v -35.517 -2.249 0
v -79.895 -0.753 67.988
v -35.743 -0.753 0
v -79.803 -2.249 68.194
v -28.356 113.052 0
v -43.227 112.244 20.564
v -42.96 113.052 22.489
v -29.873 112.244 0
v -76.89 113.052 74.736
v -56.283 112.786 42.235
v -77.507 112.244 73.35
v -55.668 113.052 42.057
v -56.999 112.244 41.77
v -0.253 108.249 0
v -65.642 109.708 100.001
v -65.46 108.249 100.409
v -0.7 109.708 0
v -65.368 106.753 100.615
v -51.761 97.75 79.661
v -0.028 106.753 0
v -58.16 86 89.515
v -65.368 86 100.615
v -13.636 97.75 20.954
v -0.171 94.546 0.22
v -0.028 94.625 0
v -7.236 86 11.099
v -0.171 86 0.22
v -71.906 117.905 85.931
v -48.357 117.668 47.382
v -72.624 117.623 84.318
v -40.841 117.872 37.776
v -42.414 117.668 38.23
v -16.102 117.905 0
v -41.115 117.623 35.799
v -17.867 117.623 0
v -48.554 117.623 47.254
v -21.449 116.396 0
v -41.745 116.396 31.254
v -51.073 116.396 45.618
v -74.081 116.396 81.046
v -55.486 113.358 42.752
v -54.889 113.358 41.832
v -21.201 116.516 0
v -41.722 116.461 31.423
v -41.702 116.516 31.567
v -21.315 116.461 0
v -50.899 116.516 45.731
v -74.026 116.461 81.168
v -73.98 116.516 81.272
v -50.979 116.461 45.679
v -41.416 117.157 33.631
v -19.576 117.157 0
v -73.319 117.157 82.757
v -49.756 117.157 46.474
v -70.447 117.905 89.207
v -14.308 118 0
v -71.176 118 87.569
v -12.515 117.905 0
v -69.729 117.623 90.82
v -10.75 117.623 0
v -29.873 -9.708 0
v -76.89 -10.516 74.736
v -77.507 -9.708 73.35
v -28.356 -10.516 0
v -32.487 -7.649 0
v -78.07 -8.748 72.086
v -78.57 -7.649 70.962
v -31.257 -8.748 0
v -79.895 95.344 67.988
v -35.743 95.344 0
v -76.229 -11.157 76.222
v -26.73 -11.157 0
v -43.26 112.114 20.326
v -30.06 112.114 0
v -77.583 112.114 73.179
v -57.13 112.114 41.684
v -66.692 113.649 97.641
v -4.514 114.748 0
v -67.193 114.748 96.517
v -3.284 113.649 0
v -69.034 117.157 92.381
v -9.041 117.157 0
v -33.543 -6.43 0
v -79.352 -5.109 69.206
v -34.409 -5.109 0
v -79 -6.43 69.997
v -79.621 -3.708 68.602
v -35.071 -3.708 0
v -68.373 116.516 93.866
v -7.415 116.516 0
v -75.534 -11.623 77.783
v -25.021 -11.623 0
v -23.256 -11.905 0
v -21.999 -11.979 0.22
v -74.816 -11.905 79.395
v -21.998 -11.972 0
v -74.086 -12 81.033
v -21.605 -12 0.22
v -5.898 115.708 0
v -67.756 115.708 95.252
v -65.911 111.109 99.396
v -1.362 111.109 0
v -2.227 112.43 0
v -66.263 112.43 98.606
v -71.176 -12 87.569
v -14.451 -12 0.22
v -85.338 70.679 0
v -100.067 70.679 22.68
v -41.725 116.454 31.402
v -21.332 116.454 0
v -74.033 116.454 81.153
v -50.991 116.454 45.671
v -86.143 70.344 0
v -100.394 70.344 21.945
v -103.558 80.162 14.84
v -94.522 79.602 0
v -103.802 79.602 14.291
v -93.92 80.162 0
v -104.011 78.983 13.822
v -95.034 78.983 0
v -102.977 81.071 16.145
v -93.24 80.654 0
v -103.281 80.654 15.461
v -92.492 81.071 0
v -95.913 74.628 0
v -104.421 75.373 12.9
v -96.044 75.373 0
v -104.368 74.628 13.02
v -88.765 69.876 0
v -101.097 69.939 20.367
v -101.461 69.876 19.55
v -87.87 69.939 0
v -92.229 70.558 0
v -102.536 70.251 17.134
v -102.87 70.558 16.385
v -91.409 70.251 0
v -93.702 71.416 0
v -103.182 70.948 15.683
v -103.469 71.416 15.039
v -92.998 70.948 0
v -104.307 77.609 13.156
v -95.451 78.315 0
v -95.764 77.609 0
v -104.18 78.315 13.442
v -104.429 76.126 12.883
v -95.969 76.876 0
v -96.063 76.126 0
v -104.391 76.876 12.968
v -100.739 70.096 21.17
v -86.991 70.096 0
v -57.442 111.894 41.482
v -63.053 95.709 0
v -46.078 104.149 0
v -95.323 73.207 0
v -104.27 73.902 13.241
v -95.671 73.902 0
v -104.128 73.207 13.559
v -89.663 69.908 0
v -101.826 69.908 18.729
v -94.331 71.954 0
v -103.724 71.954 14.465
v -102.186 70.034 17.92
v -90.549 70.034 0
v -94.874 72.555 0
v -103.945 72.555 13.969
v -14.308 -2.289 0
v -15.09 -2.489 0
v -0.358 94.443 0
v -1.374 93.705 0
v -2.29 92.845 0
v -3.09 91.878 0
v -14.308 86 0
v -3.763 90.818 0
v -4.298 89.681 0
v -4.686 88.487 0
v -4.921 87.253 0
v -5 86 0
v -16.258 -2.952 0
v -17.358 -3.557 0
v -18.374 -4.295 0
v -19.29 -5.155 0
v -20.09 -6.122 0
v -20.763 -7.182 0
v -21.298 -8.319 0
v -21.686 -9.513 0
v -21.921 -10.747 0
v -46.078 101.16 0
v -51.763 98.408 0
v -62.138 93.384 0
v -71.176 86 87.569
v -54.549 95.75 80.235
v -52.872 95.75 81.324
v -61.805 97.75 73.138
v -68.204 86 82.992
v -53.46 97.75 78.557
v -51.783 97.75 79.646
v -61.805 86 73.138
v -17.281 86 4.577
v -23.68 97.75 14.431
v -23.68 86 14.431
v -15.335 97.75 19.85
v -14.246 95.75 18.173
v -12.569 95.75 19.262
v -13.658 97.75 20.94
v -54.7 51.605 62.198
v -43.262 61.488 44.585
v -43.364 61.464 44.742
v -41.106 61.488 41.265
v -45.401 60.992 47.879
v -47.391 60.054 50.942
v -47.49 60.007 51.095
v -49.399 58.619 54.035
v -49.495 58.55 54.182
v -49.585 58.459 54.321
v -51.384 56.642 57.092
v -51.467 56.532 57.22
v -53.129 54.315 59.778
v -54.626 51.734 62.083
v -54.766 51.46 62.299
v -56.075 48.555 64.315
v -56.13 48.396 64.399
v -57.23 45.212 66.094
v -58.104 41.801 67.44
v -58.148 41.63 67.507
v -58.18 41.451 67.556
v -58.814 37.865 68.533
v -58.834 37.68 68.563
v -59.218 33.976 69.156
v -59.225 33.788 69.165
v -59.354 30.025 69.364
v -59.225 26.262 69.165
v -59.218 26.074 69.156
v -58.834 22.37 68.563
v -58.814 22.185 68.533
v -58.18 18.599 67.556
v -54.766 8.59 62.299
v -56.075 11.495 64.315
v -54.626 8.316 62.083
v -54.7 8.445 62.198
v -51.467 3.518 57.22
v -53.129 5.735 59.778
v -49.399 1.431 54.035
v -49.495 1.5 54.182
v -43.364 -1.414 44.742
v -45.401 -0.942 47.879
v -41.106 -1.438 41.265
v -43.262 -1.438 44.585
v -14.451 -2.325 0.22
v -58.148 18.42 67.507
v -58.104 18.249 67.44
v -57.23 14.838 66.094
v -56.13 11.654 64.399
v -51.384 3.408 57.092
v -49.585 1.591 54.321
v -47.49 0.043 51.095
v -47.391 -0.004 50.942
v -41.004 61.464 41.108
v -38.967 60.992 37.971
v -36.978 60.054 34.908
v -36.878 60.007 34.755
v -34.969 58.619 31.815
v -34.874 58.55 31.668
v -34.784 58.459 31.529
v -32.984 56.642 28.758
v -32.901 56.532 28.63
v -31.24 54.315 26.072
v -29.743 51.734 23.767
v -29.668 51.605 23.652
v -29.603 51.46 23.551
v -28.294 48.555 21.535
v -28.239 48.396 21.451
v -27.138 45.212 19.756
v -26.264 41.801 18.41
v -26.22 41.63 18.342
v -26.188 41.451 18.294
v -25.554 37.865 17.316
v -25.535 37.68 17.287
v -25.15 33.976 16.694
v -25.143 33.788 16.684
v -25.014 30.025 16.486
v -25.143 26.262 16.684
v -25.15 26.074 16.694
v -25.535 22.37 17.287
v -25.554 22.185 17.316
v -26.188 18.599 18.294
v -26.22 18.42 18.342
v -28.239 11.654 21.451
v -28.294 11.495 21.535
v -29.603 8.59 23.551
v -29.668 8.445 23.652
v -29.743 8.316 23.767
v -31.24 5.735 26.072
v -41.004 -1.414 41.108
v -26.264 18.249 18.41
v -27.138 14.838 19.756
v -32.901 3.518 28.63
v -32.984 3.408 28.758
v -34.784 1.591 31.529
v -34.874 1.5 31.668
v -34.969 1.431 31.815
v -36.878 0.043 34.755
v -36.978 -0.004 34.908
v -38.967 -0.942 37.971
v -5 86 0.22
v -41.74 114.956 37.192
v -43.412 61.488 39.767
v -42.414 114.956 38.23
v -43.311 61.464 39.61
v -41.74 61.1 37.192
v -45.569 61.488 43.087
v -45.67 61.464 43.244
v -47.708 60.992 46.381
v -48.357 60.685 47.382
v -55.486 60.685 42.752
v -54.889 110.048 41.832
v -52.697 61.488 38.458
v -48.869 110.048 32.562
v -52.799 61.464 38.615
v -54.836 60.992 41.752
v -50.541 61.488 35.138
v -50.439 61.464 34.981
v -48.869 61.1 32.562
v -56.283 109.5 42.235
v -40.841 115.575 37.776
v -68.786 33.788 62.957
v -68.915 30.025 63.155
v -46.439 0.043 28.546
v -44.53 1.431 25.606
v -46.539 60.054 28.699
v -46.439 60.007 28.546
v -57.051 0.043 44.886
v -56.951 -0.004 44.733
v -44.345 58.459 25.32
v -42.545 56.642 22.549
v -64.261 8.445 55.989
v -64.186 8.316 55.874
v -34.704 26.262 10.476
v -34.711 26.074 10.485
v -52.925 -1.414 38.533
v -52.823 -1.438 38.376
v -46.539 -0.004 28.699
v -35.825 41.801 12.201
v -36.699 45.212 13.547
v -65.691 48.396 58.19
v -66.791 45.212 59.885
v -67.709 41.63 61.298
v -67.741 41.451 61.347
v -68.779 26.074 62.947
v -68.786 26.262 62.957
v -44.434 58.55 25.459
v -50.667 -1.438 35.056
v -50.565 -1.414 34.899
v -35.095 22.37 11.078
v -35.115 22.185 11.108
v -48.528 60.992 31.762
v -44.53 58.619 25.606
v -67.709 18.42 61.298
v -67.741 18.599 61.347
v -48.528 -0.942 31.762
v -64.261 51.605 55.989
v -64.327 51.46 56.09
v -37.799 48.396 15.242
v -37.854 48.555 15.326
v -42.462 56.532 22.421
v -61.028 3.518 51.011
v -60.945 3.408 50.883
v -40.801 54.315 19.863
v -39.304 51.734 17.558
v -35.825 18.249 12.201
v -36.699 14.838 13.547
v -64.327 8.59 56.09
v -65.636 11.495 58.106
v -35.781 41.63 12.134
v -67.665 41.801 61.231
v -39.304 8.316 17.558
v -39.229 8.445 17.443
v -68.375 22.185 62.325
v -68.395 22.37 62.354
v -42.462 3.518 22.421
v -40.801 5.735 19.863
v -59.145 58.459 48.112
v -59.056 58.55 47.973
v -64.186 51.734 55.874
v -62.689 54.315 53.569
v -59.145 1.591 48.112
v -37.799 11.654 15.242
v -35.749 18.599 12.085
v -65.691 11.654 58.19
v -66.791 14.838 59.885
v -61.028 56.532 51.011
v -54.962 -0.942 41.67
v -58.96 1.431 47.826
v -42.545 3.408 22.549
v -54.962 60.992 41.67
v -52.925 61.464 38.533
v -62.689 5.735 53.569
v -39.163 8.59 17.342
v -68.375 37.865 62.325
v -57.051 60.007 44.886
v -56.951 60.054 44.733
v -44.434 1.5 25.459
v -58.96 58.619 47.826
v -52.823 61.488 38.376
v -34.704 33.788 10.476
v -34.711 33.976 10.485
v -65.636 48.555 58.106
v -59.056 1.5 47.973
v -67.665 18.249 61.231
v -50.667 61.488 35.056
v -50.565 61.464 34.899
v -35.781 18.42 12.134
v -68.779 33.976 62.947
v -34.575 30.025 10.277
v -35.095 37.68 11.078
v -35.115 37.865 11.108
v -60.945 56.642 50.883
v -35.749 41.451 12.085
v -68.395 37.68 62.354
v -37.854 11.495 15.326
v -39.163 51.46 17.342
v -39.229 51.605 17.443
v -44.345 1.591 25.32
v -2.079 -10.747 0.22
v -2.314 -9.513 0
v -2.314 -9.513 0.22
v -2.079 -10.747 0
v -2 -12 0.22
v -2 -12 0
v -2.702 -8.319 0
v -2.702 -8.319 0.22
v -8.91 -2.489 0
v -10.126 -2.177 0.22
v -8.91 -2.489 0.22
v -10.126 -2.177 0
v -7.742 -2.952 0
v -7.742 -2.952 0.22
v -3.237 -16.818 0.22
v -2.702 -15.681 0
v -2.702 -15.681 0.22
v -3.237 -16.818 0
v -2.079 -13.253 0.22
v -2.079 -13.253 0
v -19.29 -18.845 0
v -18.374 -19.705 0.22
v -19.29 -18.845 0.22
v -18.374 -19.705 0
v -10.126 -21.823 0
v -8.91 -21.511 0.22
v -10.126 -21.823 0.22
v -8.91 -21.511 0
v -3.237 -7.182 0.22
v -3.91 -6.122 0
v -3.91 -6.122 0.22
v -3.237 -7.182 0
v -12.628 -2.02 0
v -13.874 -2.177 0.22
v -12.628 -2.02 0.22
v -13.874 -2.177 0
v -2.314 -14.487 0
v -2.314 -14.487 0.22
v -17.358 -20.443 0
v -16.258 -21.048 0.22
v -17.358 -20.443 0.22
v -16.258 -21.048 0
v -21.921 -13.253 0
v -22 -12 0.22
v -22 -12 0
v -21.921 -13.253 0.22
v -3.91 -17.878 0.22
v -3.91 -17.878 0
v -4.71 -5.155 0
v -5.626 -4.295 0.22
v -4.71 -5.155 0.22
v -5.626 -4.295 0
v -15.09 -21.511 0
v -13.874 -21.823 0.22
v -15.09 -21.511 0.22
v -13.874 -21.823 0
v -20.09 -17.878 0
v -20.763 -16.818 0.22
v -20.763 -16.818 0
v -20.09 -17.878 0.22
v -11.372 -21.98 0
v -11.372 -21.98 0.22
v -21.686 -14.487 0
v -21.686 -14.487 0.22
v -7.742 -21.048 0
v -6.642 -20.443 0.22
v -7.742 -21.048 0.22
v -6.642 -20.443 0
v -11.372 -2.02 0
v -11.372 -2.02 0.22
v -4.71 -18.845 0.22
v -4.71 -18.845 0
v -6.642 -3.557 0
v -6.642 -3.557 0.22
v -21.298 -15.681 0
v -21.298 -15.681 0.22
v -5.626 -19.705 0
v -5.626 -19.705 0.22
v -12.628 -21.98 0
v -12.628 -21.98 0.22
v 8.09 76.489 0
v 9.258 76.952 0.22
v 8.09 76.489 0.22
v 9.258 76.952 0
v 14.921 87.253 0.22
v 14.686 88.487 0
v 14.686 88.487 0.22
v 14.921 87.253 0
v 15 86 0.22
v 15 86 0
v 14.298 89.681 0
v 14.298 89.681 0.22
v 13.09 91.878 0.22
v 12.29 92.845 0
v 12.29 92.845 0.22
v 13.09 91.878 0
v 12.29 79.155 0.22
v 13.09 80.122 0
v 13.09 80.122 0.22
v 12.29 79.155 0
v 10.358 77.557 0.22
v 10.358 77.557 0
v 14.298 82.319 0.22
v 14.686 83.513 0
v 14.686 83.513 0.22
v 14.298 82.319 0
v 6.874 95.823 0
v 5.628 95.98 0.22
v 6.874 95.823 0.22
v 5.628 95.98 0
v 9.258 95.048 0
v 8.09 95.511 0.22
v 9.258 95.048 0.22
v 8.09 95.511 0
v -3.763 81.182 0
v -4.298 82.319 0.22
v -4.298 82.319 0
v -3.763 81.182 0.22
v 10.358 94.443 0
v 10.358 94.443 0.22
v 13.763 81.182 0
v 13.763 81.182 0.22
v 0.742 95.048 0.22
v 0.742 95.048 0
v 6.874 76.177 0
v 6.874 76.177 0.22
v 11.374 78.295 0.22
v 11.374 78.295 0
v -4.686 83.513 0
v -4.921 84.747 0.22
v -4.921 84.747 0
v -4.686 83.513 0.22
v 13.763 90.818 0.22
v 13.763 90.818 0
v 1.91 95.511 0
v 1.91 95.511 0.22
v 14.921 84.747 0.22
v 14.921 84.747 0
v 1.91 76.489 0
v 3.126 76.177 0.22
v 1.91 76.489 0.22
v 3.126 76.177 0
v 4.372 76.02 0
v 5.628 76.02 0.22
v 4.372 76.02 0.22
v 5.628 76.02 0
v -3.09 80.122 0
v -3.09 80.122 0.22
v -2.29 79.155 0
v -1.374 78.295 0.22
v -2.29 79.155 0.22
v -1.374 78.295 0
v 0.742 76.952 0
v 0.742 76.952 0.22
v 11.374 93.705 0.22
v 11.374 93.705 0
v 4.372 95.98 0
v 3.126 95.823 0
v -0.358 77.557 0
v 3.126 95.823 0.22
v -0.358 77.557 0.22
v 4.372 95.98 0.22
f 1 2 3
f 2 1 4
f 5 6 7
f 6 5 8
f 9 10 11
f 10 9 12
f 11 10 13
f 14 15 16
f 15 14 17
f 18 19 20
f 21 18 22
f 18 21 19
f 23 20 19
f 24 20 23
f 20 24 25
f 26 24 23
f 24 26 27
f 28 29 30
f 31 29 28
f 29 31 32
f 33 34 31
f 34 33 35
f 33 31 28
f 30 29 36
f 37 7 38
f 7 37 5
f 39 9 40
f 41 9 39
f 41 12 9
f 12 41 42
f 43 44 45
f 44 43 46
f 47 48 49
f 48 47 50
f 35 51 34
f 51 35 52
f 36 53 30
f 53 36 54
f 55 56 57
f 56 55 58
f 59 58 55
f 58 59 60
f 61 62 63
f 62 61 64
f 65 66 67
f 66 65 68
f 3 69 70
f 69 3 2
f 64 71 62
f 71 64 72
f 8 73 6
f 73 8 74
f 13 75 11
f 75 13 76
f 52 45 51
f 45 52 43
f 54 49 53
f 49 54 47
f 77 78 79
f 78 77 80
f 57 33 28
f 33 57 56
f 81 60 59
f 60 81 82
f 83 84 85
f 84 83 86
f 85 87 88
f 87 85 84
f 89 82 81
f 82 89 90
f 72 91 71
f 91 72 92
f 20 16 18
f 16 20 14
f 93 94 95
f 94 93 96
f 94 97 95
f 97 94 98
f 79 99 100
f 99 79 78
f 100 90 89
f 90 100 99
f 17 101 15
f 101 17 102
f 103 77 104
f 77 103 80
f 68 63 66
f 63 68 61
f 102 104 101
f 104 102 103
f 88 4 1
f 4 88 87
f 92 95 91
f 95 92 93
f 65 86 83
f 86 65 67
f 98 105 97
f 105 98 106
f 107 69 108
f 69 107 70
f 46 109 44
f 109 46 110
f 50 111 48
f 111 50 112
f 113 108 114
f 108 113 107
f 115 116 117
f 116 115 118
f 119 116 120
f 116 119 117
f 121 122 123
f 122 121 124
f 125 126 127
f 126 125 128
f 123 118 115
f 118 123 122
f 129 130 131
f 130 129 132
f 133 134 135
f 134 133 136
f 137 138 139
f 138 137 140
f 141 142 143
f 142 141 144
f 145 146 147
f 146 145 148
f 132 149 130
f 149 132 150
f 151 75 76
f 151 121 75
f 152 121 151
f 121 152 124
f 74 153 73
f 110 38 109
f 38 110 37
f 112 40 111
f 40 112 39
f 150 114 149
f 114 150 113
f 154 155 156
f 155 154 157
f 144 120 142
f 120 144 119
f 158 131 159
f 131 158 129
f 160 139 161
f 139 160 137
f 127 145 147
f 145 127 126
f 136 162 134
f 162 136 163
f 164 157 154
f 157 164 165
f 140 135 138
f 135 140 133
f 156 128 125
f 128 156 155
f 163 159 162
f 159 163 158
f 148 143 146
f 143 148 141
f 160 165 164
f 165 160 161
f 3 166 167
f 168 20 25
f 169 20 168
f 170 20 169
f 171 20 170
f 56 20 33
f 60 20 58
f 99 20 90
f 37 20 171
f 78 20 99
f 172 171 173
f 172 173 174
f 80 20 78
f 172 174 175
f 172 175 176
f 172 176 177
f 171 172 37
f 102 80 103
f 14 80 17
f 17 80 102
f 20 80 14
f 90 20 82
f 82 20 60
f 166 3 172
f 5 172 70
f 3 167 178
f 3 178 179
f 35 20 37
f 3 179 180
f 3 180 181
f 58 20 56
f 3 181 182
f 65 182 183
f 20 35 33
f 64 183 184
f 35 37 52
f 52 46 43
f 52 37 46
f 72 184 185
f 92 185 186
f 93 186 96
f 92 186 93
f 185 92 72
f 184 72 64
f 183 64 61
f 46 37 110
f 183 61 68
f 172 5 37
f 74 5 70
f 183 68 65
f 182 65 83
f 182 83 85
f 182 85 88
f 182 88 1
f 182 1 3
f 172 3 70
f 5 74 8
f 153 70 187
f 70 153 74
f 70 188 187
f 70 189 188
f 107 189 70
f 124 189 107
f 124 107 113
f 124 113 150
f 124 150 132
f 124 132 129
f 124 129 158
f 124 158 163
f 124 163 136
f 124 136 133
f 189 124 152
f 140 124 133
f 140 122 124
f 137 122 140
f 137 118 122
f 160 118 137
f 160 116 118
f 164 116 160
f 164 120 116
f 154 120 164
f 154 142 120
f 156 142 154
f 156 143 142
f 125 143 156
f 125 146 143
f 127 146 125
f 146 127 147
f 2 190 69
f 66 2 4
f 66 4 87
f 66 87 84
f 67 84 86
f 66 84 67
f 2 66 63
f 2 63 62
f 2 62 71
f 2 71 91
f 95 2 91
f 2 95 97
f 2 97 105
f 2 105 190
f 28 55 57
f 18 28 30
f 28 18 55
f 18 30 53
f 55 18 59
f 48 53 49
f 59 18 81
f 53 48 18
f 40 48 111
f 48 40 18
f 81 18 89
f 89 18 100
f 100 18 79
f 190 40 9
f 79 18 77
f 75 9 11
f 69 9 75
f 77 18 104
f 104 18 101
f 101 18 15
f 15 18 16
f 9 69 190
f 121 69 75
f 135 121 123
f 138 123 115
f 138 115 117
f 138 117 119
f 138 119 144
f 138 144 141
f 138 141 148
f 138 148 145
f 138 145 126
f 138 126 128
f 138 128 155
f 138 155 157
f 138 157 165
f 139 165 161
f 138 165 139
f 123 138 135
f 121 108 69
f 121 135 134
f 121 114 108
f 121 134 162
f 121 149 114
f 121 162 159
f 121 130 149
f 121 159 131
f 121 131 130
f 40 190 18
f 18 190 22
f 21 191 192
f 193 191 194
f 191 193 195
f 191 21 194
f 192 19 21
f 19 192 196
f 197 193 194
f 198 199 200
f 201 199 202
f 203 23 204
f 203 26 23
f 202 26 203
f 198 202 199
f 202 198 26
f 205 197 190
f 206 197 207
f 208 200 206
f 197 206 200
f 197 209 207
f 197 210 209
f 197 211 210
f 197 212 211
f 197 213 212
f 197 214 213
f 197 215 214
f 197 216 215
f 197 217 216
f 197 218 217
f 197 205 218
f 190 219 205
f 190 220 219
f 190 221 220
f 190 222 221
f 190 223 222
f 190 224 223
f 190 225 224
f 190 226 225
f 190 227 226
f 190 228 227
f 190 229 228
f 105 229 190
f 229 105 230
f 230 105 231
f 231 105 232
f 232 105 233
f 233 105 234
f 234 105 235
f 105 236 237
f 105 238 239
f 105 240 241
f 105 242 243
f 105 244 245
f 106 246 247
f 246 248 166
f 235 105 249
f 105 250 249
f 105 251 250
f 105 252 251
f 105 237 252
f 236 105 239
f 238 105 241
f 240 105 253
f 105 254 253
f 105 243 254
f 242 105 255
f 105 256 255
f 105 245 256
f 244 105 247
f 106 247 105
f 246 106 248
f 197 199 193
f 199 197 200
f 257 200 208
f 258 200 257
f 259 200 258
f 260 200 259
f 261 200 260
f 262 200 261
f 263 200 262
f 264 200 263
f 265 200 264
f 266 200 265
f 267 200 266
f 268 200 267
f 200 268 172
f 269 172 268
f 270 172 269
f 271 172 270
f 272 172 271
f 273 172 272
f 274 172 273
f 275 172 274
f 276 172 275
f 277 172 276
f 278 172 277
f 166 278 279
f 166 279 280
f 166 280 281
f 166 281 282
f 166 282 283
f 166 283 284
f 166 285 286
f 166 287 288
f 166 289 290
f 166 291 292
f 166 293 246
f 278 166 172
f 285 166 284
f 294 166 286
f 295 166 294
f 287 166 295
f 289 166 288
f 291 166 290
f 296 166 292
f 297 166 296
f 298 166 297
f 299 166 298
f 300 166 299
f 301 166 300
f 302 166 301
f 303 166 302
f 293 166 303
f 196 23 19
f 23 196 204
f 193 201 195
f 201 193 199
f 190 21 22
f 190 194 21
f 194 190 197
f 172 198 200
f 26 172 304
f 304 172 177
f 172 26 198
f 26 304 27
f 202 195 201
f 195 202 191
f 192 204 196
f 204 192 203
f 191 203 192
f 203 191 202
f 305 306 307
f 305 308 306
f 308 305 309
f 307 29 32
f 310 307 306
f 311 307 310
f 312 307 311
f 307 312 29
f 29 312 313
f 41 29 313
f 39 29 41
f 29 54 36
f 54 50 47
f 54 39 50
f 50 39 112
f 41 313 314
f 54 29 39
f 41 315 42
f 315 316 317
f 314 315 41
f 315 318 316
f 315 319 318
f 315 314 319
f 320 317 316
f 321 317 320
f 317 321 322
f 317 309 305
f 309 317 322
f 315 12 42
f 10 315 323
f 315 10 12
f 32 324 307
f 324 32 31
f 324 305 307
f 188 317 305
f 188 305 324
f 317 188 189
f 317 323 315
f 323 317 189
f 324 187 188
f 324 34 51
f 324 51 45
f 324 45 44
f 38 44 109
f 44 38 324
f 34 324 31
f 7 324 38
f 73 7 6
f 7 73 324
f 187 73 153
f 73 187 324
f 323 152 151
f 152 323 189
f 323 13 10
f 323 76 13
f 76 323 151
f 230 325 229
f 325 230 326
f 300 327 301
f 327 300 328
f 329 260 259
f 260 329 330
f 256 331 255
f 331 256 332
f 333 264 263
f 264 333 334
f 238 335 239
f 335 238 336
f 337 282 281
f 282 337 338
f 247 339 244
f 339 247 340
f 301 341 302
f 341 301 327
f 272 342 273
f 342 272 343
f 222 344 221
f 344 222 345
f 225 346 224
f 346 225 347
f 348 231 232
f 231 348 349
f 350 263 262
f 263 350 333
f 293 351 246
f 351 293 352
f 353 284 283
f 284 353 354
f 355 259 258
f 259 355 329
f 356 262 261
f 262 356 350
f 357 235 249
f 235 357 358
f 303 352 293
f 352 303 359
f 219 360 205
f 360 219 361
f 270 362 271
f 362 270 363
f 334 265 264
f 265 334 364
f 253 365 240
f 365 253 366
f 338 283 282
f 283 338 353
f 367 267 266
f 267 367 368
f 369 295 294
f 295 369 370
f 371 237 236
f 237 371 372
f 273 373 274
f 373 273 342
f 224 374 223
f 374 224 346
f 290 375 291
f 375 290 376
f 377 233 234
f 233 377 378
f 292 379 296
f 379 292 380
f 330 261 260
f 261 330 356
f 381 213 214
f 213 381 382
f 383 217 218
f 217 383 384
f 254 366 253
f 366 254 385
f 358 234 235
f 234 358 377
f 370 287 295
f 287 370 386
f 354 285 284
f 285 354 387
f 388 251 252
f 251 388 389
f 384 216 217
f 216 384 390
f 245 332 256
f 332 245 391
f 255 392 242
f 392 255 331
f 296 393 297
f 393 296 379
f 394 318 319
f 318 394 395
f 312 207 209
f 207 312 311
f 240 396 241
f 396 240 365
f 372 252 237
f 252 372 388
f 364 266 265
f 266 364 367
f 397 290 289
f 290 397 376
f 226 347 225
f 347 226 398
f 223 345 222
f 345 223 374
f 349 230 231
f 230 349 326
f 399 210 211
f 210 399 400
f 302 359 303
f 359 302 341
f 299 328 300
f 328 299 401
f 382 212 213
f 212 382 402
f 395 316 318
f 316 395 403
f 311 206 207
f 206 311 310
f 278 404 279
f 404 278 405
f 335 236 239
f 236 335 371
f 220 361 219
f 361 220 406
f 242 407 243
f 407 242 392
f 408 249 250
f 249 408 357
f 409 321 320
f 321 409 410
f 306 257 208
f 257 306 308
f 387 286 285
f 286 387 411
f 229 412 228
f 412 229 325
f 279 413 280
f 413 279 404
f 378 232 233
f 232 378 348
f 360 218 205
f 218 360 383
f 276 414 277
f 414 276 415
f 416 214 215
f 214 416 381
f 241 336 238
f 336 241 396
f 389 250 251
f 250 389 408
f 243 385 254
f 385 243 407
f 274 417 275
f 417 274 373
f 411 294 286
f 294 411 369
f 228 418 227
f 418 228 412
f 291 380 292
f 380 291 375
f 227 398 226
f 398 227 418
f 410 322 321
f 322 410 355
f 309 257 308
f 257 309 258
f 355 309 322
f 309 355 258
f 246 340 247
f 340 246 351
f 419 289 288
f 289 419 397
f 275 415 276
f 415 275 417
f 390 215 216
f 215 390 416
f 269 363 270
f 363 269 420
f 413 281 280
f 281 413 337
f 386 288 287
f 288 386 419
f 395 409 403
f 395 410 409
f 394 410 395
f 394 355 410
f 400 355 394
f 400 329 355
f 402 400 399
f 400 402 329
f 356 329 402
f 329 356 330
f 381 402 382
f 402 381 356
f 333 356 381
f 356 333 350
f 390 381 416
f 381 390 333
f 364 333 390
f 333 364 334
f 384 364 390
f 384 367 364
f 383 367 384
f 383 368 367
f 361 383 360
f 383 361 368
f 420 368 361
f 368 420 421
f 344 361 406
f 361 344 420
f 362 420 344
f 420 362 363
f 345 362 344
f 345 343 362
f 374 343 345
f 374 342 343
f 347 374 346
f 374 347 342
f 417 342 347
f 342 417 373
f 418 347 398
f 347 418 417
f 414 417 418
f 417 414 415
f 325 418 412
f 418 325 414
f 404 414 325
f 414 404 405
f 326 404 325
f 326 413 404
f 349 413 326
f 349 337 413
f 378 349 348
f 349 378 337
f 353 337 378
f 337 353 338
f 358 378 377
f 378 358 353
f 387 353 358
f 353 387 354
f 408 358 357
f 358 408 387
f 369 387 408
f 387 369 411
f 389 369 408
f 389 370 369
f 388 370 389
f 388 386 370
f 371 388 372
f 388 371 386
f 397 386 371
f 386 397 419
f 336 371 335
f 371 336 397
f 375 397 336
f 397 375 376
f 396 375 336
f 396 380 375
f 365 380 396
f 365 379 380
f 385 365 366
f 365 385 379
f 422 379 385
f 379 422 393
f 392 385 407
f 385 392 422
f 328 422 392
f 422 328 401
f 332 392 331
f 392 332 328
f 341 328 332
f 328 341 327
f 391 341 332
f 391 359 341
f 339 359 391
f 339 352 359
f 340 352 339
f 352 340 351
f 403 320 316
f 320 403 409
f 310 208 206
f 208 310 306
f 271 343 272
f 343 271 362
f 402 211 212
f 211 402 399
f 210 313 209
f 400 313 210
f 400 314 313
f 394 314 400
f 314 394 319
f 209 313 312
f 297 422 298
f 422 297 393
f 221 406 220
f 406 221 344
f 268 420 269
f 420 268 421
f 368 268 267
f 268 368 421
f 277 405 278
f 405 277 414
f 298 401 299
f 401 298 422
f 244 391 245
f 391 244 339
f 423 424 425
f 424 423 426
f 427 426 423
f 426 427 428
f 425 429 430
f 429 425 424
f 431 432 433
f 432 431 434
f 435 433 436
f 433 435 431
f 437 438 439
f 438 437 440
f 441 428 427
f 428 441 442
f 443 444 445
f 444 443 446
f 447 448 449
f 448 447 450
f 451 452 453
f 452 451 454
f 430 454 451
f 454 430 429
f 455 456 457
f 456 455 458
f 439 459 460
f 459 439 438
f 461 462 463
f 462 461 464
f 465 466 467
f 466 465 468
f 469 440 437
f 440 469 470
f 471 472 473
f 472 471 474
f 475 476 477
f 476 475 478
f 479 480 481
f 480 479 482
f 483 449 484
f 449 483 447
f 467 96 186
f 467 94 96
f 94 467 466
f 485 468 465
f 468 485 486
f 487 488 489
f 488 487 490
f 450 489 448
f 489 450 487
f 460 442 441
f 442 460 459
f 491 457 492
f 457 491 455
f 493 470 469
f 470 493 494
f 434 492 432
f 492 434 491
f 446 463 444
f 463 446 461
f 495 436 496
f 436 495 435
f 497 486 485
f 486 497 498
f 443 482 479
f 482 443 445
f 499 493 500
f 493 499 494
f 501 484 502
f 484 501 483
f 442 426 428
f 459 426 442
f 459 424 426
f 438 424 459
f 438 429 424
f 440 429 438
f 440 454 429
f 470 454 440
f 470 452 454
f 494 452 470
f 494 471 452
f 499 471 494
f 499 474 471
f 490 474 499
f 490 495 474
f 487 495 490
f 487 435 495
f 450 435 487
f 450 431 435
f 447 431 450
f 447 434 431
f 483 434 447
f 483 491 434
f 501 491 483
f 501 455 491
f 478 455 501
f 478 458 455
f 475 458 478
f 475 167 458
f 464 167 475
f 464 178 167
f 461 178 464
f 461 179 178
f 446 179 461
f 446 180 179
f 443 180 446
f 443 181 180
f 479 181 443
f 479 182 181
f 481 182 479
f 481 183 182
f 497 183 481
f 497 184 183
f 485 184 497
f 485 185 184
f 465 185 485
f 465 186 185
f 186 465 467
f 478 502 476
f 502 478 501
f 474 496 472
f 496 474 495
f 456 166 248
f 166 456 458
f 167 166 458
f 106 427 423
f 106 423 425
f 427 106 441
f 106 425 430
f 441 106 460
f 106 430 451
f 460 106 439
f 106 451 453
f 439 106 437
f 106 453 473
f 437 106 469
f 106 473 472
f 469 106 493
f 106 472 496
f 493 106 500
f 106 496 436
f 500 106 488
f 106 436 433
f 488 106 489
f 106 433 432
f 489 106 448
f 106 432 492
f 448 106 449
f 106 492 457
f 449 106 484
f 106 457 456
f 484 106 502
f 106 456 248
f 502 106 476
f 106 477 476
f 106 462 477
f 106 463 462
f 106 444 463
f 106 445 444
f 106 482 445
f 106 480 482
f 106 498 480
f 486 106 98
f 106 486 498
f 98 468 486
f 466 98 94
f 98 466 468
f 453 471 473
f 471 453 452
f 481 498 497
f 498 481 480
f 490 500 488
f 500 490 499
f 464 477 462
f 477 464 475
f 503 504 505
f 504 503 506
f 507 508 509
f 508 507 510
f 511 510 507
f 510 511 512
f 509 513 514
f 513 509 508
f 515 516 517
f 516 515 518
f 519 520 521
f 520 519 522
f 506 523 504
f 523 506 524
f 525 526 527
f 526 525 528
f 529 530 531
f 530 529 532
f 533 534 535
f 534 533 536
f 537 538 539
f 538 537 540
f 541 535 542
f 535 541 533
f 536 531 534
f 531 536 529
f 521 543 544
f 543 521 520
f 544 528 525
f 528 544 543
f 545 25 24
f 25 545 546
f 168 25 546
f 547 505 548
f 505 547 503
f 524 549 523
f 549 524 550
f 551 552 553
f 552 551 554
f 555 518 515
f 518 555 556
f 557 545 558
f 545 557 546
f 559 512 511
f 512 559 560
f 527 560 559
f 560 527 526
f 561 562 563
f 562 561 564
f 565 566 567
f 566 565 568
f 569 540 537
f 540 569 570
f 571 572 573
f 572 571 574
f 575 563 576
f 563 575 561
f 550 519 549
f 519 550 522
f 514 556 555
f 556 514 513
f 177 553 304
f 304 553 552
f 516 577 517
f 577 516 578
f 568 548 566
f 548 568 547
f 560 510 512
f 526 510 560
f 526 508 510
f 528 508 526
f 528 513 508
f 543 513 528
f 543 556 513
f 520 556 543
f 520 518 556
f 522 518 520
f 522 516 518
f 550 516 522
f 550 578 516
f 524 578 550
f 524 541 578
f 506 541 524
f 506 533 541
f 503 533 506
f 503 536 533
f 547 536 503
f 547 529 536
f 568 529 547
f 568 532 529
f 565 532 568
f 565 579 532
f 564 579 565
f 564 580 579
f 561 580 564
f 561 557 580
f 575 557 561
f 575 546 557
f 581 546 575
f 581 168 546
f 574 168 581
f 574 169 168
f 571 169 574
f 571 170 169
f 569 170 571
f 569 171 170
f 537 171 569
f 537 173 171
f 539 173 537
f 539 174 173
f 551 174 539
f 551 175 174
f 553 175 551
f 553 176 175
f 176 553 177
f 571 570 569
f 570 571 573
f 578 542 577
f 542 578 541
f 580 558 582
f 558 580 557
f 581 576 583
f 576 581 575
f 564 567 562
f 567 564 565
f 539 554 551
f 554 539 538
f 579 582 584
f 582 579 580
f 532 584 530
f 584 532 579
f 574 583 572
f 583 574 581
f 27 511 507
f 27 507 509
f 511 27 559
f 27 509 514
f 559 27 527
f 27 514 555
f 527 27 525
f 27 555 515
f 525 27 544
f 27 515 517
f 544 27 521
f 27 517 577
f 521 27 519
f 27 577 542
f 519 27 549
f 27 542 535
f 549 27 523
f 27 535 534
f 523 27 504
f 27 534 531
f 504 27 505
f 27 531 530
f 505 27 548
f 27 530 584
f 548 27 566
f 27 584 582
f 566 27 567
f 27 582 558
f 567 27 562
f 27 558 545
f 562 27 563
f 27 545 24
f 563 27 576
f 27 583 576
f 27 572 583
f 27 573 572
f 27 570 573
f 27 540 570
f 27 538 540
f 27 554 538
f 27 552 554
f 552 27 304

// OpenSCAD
// Stand for nexus 5 and nexus 7 2013 tablet
// Has a hole for the chrger

function what_fillet(l,w) = (norm([w,w]) - l) / (norm([1,1]) - 1);
e=0.15;

nexus_charger = false;

// nexus charger
charger_top_w = 58;
charger_top_diagonal = 80.64;
charger_top_fillet_r = what_fillet(charger_top_diagonal, charger_top_w) / 2;
charger_top_h = 2.9;
charger_sticker_h = 0;
charger_h = 12.2;
charger_bottom_w = 49.23;
charger_bottom_diagonal = 65.00;
charger_bottom_fillet_r = what_fillet(charger_bottom_diagonal, charger_bottom_w) / 2;
// round charger
rcharger_r = 60.05/2;
rcharger_h = 11.4;
charger_plug_w = 12.0 + e;
charger_plug_h = nexus_charger
  ? charger_h - charger_top_h 
  : rcharger_h - charger_top_h;
bottom_offset = (charger_top_w - charger_bottom_w) / 2;
charger_outset = 1.5;
$fn=50;

n6_lip = 2;

n5_w = 70;
n5_l = 137.5;
n5_thick = 10 + n6_lip;

n7_w = 200;
n7_l = 114;
n7_thick = 9.5;

stand_w = 120;
stand_r = 12;
stand_r_base = 7;
stand_angle = 30;
stand_side_angle = 33;
device_offset = max(n5_thick, n7_thick);

module nexus_charger() {
  hull() {
    for (x = [0,1],y = [0,1]) {
      translate([
        2*x*(bottom_offset + charger_bottom_fillet_r) + x*(charger_bottom_w-2*charger_bottom_fillet_r),
        2*y*(bottom_offset + charger_bottom_fillet_r) + y*(charger_bottom_w-2*charger_bottom_fillet_r),
        0])
      mirror([x,y,0]) {
        translate([charger_top_fillet_r, charger_top_fillet_r, charger_h - charger_top_h])
        cylinder(r=charger_top_fillet_r, h=charger_top_h);
        translate([bottom_offset + charger_bottom_fillet_r, bottom_offset + charger_bottom_fillet_r, charger_sticker_h])
        cylinder(r=charger_bottom_fillet_r, h=charger_h-charger_sticker_h);
      }
    }
  }
  hull() {
    for (x = [0,1],y = [0,1]) {
      translate([
        2*x*(bottom_offset + charger_bottom_fillet_r) + x*(charger_bottom_w-2*charger_bottom_fillet_r),
        2*y*(bottom_offset + charger_bottom_fillet_r) + y*(charger_bottom_w-2*charger_bottom_fillet_r),
        0])
      mirror([x,y,0]) {
        translate([bottom_offset + charger_bottom_fillet_r, bottom_offset + charger_bottom_fillet_r,0])
        cylinder(r=charger_bottom_fillet_r, h=charger_sticker_h);
      }
    }
  }
}

module round_charger() {
  translate([rcharger_r, rcharger_r, charger_h - rcharger_h])
  cylinder(r=rcharger_r, h = rcharger_h);
}

module charger() {
  if (nexus_charger) {
    nexus_charger();
  } else {
    round_charger();
  }
}

module box_on_charger(x,y,z) {
  offset = charger_top_w / 2;
  translate([-x/2 + offset,-y/2 + offset,charger_h])
  cube([x,y,z]);
}

module devices(dev_thick) {
  n5_tip = (n5_l - n7_l) / 2;
  wedge_w = norm([n5_tip, n5_tip]);
  offset_x = charger_top_w / 2 - n5_w / 2;
  offset_y = charger_top_w / 2 - n5_l / 2;

  difference() {
    union() {
      box_on_charger(n5_w, n5_l, dev_thick);
      box_on_charger(n7_w, n7_l, dev_thick);
      translate([offset_x,offset_y,charger_h])
      for (x = [0,n5_w], y = [0,n5_l - 2*n5_tip]) {
        translate([x,y,0])
        rotate([0,0,45])
        cube([wedge_w, wedge_w, dev_thick]);
      }
    }
    translate([-wedge_w/2, charger_top_w - offset_y - n6_lip, 2 * dev_thick + e])
    rotate([0, 90, 0])
    cube([n6_lip, n6_lip, n5_w+wedge_w]);
    // TODO: add tablet lip
  }
}

module charger_hole() {
  offset_z = nexus_charger ? 0 : charger_h - rcharger_h;
  translate([charger_top_w/2 + charger_plug_w/2,charger_top_w/2,offset_z + e])
  rotate([0,0,90])
  cube([stand_w,charger_plug_w,charger_plug_h]);
}

module cable_hole() {
    translate([charger_top_w/2 - charger_plug_w/2, charger_top_w+5*stand_r-charger_plug_h, 0])
    rotate([-stand_angle, 0, 0])
    rotate([0,-45,0])
    translate([0, 0, -stand_w])
    cube([charger_plug_w/sqrt(2)*2, charger_plug_h, stand_w]);
}

module negatives() {
  offset = max(n5_thick, n7_thick);
  translate([0, 0, -offset - charger_h]) {
    devices(offset);
    charger_hole();
    hull() {
      cable_hole();
      translate([0,10,0])
      cable_hole();
    }

    minkowski() {
      charger();
      cylinder(r=charger_outset, h=charger_outset);
    }
  }
}

module pillar(x,y,is_slim) {
  offset = [
    (is_slim? stand_r/2 * cos(stand_angle) : 0),
    (is_slim? stand_r/2 * sin(stand_angle) : 0),
    0];
  translate([x , y , 0]  + offset ) {
    cylinder(r=!is_slim ? stand_r : stand_r/2, h=stand_w);
  }
}

module ear(x,y) {
  translate([x,y,0])
  cylinder(r=10,h=0.22);
}

module wedge(a, l) {
  intersection() {
    rotate([a,0,0])
    cube(2*[l,l,l]);
    translate([0,0,stand_w])
    rotate([-90-a,0,0])
    cube(2*[l,l,l]);
  }
}

module stand_body() {
  stand_body_l = 4*stand_r + charger_top_w;
  translate([stand_w,0,0])
  rotate([0,0,90])
  rotate([-90,0,0])
  translate([0,stand_r,0])
  intersection() {
    union() {
      hull() {
        pillar(0,0,false);
        pillar(0,stand_r/2,false);
        pillar(stand_body_l, 0,false);
        pillar(stand_body_l - stand_r/2*tan(stand_angle), stand_r/2,false);
      }
      hull() {
        pillar(stand_body_l, 0,true);
        translate([stand_body_l,0,0])
        rotate([0,0,stand_angle])
        pillar(0, -1.25*stand_body_l*sin(-stand_angle), true);
      }
    }
    translate([-stand_r,-stand_r,0])
    wedge(stand_side_angle, stand_body_l);
  }
}

rotate([0,-stand_side_angle,0])
translate([0,0,stand_w+(charger_top_w / 2 - stand_w / 2)])
rotate([0,90,0])
difference() {
  translate([charger_top_w / 2 - stand_w / 2, 0, 0])
  stand_body();
  negatives();
}
ear(-stand_r,-stand_r);
ear(5,n7_l/2+charger_top_w/2);
